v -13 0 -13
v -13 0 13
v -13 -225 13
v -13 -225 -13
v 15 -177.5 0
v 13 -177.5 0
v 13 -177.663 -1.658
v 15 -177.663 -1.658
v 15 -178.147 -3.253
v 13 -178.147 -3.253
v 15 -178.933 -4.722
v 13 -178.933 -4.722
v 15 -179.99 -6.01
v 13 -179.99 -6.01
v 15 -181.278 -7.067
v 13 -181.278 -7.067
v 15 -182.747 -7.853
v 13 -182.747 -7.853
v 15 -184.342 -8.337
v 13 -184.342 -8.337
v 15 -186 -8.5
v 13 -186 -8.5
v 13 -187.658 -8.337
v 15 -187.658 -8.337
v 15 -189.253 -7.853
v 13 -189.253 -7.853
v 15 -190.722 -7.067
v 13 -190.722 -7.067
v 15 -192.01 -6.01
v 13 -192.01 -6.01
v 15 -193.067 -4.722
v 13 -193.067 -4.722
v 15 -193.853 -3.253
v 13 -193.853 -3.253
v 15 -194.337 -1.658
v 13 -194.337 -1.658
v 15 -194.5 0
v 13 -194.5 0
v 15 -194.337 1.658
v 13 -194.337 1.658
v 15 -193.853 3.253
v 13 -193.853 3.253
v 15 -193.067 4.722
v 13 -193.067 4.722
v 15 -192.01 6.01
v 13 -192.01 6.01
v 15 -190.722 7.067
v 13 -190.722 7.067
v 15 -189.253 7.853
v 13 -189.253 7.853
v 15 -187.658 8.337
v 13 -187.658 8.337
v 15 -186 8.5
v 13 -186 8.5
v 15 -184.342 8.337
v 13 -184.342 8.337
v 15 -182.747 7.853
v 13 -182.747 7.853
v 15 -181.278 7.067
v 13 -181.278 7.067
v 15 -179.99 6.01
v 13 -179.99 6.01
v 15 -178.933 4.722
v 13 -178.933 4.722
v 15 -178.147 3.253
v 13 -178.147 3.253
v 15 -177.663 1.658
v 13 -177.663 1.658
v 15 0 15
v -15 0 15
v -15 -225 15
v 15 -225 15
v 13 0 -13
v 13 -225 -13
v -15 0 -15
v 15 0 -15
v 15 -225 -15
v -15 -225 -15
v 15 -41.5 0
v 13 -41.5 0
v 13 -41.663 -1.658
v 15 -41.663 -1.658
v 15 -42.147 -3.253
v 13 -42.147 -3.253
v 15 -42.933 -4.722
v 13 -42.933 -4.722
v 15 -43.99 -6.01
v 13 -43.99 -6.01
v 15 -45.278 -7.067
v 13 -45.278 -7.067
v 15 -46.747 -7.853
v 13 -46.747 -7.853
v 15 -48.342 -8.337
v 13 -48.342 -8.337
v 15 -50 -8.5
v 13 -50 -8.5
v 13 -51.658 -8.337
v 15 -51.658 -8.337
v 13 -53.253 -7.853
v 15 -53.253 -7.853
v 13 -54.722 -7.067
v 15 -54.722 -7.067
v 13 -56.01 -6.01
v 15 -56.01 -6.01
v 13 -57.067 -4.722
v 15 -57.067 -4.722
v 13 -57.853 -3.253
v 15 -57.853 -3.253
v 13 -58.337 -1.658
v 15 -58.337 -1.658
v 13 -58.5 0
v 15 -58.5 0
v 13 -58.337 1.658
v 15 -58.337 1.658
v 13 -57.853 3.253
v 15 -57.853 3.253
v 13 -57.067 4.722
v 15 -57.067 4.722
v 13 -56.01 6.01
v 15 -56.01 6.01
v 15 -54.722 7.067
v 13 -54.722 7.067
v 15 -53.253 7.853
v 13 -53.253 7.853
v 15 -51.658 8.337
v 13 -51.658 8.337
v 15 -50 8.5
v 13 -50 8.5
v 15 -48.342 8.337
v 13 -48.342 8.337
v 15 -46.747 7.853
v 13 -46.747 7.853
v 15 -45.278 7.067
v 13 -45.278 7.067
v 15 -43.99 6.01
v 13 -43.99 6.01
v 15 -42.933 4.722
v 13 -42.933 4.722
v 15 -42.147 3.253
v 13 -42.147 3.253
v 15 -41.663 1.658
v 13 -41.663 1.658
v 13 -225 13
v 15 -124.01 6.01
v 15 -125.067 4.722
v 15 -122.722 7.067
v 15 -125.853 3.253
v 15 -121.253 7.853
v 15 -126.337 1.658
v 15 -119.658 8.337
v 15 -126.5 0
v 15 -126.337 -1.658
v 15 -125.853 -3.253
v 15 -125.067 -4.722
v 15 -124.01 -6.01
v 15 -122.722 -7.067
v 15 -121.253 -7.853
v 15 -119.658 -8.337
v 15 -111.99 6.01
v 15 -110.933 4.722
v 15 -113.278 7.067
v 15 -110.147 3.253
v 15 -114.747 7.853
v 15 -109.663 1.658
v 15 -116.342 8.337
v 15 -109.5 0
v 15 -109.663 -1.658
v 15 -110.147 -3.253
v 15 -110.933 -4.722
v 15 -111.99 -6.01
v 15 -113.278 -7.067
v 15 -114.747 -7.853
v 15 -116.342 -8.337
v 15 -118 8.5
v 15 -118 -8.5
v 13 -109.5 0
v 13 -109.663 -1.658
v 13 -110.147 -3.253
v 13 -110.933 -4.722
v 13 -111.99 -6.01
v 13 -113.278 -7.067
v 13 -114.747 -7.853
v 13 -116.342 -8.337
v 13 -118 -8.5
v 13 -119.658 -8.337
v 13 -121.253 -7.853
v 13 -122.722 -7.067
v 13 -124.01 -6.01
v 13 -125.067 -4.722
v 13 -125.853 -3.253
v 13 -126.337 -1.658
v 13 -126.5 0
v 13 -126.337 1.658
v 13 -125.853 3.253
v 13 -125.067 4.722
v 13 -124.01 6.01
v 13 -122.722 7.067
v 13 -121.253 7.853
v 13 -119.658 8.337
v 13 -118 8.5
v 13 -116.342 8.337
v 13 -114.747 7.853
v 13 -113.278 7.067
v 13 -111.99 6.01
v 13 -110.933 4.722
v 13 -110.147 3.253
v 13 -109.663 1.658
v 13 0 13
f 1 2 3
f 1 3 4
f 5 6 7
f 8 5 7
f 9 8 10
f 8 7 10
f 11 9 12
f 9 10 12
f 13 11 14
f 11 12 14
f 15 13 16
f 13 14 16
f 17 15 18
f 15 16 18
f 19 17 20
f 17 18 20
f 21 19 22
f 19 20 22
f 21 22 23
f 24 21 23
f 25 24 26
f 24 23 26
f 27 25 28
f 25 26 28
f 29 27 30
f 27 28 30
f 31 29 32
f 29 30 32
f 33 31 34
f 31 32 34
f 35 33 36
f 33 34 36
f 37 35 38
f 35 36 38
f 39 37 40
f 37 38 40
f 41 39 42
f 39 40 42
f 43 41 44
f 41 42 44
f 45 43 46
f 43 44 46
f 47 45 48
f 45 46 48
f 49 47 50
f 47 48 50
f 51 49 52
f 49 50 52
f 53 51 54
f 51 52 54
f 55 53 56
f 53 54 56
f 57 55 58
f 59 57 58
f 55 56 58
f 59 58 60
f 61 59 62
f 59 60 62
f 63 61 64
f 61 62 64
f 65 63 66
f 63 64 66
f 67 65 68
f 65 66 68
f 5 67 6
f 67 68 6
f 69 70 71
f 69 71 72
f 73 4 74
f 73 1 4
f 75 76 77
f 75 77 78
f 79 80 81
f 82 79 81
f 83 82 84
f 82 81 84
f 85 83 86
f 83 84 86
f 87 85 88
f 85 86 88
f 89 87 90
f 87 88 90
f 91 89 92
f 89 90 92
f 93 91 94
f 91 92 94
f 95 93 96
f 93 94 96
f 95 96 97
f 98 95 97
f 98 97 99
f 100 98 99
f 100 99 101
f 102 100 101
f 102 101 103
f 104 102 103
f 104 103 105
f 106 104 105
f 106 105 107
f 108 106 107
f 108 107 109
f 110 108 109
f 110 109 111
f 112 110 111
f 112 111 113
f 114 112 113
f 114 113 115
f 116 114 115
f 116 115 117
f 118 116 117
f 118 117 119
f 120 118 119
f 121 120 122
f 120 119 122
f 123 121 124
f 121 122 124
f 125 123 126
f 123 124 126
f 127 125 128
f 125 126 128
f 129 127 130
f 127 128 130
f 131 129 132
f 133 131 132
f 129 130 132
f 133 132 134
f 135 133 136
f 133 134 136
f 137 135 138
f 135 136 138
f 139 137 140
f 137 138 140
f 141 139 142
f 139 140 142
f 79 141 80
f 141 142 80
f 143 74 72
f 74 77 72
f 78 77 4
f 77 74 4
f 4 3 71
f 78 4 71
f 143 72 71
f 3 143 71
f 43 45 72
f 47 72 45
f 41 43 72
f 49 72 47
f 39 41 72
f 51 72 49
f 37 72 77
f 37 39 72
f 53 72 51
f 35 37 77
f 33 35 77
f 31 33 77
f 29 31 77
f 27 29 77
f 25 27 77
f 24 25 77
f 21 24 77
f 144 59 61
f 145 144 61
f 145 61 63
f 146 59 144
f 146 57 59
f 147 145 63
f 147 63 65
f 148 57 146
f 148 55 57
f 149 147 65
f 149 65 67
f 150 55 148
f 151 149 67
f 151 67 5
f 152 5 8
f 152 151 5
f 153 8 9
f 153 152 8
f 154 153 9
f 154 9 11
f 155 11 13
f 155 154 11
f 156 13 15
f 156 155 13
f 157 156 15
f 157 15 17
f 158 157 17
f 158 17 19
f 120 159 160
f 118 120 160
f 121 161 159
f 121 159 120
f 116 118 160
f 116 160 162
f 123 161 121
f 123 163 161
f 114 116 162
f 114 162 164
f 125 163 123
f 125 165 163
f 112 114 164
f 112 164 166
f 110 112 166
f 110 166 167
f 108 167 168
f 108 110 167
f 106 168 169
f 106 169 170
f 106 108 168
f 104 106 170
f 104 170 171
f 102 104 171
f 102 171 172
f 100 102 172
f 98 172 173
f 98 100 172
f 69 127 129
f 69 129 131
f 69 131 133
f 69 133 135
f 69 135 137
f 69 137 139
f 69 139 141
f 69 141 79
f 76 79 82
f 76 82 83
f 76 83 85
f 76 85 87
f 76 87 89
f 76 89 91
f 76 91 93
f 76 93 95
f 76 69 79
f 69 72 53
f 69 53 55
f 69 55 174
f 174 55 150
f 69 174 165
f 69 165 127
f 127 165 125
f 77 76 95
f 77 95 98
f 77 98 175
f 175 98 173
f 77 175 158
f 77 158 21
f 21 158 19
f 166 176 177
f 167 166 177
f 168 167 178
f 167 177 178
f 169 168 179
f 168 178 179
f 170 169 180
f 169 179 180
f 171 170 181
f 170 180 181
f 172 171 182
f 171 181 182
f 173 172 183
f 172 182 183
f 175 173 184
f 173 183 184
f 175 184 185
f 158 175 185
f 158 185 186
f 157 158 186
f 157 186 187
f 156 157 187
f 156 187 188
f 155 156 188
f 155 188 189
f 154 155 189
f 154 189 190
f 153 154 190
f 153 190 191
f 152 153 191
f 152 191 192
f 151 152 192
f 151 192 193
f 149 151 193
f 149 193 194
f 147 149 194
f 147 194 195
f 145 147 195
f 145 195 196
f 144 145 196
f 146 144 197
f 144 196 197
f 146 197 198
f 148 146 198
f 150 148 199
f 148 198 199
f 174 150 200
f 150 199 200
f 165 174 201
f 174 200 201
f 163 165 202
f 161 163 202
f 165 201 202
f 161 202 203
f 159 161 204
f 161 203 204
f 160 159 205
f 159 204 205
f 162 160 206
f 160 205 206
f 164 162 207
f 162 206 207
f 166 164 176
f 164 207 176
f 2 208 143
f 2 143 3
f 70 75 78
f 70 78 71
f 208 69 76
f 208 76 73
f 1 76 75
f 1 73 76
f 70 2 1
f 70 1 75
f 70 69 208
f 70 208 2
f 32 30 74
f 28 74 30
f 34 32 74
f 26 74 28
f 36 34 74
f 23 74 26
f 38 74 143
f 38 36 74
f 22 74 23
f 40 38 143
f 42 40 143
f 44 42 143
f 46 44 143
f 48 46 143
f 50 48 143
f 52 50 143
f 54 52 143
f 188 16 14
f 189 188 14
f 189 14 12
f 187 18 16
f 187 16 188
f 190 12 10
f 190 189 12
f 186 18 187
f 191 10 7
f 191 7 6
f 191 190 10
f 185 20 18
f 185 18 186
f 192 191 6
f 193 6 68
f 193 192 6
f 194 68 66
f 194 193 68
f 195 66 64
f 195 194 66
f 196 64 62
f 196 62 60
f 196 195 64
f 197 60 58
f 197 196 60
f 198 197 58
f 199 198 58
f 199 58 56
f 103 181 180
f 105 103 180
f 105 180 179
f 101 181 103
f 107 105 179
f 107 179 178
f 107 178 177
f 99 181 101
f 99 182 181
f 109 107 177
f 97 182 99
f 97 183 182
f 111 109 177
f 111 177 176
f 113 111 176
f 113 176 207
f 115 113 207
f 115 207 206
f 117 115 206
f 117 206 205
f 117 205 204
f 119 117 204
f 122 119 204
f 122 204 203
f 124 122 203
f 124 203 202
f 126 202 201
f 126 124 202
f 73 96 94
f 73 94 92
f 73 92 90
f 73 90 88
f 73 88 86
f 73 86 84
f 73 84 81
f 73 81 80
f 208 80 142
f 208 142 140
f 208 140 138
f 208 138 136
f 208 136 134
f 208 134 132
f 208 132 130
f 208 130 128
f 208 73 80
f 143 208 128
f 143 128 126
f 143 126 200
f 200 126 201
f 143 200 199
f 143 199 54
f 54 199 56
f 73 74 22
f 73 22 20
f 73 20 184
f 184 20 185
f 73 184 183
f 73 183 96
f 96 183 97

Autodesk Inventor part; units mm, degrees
ref_plane "YZ Plane" through (0, 0, 0) normal (1, 0, 0) x (0, 1, 0)
ref_plane "XZ Plane" through (0, 0, 0) normal (0, 1, 0) x (-1, 0, 0)
ref_plane "XY Plane" through (0, 0, 0) normal (0, 0, 1) x (1, 0, 0)
sketch "Sketch9" plane through (0, 0, 0) normal (0, 1, 0) x (-1, 0, 0)
  line L0 (15, 15) -> (-15, 15)
  line L1 (-15, 15) -> (-15, -15)
  line L2 (-15, -15) -> (15, -15)
  line L3 (15, -15) -> (15, 15)
  line L4 (15, 15) -> (-15, -15) construction
  line L5 (-15, 15) -> (15, -15) construction
  line L6 (-13, 13) -> (13, 13)
  line L7 (13, 13) -> (13, -13)
  line L8 (13, -13) -> (-13, -13)
  line L9 (-13, -13) -> (-13, 13)
  point P0 (0, 0)
  dimension "d172" = 30
  dimension "d173" = 30
  dimension "d174" = 2
extrude "Extrusion3" add sketch "Sketch9" against normal blind 225
sketch "Sketch10" plane through (0, 0, 0) normal (1, 0, 0) x (0, 1, 0)
  line L0 (0, 15) -> (0, -15) construction
  line L1 (0, 15) -> (-225, 15) construction
  line L2 (0, -15) -> (-225, -15) construction
  line L3 (-58.5, 8.5) -> (-41.5, 8.5)
  line L4 (-41.5, 8.5) -> (-41.5, -8.5)
  line L5 (-41.5, -8.5) -> (-58.5, -8.5)
  line L6 (-58.5, -8.5) -> (-58.5, 8.5)
  line L7 (-58.5, 8.5) -> (-41.5, -8.5) construction
  line L8 (-41.5, 8.5) -> (-58.5, -8.5) construction
  line L9 (0, 0) -> (30, 0)
  circle A0 centre (-50, 0) radius 8.5
  dimension "d177" = 17
  dimension "d178" = 17
  dimension "d181" = 30
  dimension "d182" = 80
extrude "Extrusion4" cut sketch "Sketch10" along normal through all contours A0
pattern_linear "Rectangular Pattern4" count 4 spacing 68 along (0, -1, 0) of "Extrusion4"
properties part number "PRS 1662 DrSysB way tube 44_D1200" material "Stainless Steel"
